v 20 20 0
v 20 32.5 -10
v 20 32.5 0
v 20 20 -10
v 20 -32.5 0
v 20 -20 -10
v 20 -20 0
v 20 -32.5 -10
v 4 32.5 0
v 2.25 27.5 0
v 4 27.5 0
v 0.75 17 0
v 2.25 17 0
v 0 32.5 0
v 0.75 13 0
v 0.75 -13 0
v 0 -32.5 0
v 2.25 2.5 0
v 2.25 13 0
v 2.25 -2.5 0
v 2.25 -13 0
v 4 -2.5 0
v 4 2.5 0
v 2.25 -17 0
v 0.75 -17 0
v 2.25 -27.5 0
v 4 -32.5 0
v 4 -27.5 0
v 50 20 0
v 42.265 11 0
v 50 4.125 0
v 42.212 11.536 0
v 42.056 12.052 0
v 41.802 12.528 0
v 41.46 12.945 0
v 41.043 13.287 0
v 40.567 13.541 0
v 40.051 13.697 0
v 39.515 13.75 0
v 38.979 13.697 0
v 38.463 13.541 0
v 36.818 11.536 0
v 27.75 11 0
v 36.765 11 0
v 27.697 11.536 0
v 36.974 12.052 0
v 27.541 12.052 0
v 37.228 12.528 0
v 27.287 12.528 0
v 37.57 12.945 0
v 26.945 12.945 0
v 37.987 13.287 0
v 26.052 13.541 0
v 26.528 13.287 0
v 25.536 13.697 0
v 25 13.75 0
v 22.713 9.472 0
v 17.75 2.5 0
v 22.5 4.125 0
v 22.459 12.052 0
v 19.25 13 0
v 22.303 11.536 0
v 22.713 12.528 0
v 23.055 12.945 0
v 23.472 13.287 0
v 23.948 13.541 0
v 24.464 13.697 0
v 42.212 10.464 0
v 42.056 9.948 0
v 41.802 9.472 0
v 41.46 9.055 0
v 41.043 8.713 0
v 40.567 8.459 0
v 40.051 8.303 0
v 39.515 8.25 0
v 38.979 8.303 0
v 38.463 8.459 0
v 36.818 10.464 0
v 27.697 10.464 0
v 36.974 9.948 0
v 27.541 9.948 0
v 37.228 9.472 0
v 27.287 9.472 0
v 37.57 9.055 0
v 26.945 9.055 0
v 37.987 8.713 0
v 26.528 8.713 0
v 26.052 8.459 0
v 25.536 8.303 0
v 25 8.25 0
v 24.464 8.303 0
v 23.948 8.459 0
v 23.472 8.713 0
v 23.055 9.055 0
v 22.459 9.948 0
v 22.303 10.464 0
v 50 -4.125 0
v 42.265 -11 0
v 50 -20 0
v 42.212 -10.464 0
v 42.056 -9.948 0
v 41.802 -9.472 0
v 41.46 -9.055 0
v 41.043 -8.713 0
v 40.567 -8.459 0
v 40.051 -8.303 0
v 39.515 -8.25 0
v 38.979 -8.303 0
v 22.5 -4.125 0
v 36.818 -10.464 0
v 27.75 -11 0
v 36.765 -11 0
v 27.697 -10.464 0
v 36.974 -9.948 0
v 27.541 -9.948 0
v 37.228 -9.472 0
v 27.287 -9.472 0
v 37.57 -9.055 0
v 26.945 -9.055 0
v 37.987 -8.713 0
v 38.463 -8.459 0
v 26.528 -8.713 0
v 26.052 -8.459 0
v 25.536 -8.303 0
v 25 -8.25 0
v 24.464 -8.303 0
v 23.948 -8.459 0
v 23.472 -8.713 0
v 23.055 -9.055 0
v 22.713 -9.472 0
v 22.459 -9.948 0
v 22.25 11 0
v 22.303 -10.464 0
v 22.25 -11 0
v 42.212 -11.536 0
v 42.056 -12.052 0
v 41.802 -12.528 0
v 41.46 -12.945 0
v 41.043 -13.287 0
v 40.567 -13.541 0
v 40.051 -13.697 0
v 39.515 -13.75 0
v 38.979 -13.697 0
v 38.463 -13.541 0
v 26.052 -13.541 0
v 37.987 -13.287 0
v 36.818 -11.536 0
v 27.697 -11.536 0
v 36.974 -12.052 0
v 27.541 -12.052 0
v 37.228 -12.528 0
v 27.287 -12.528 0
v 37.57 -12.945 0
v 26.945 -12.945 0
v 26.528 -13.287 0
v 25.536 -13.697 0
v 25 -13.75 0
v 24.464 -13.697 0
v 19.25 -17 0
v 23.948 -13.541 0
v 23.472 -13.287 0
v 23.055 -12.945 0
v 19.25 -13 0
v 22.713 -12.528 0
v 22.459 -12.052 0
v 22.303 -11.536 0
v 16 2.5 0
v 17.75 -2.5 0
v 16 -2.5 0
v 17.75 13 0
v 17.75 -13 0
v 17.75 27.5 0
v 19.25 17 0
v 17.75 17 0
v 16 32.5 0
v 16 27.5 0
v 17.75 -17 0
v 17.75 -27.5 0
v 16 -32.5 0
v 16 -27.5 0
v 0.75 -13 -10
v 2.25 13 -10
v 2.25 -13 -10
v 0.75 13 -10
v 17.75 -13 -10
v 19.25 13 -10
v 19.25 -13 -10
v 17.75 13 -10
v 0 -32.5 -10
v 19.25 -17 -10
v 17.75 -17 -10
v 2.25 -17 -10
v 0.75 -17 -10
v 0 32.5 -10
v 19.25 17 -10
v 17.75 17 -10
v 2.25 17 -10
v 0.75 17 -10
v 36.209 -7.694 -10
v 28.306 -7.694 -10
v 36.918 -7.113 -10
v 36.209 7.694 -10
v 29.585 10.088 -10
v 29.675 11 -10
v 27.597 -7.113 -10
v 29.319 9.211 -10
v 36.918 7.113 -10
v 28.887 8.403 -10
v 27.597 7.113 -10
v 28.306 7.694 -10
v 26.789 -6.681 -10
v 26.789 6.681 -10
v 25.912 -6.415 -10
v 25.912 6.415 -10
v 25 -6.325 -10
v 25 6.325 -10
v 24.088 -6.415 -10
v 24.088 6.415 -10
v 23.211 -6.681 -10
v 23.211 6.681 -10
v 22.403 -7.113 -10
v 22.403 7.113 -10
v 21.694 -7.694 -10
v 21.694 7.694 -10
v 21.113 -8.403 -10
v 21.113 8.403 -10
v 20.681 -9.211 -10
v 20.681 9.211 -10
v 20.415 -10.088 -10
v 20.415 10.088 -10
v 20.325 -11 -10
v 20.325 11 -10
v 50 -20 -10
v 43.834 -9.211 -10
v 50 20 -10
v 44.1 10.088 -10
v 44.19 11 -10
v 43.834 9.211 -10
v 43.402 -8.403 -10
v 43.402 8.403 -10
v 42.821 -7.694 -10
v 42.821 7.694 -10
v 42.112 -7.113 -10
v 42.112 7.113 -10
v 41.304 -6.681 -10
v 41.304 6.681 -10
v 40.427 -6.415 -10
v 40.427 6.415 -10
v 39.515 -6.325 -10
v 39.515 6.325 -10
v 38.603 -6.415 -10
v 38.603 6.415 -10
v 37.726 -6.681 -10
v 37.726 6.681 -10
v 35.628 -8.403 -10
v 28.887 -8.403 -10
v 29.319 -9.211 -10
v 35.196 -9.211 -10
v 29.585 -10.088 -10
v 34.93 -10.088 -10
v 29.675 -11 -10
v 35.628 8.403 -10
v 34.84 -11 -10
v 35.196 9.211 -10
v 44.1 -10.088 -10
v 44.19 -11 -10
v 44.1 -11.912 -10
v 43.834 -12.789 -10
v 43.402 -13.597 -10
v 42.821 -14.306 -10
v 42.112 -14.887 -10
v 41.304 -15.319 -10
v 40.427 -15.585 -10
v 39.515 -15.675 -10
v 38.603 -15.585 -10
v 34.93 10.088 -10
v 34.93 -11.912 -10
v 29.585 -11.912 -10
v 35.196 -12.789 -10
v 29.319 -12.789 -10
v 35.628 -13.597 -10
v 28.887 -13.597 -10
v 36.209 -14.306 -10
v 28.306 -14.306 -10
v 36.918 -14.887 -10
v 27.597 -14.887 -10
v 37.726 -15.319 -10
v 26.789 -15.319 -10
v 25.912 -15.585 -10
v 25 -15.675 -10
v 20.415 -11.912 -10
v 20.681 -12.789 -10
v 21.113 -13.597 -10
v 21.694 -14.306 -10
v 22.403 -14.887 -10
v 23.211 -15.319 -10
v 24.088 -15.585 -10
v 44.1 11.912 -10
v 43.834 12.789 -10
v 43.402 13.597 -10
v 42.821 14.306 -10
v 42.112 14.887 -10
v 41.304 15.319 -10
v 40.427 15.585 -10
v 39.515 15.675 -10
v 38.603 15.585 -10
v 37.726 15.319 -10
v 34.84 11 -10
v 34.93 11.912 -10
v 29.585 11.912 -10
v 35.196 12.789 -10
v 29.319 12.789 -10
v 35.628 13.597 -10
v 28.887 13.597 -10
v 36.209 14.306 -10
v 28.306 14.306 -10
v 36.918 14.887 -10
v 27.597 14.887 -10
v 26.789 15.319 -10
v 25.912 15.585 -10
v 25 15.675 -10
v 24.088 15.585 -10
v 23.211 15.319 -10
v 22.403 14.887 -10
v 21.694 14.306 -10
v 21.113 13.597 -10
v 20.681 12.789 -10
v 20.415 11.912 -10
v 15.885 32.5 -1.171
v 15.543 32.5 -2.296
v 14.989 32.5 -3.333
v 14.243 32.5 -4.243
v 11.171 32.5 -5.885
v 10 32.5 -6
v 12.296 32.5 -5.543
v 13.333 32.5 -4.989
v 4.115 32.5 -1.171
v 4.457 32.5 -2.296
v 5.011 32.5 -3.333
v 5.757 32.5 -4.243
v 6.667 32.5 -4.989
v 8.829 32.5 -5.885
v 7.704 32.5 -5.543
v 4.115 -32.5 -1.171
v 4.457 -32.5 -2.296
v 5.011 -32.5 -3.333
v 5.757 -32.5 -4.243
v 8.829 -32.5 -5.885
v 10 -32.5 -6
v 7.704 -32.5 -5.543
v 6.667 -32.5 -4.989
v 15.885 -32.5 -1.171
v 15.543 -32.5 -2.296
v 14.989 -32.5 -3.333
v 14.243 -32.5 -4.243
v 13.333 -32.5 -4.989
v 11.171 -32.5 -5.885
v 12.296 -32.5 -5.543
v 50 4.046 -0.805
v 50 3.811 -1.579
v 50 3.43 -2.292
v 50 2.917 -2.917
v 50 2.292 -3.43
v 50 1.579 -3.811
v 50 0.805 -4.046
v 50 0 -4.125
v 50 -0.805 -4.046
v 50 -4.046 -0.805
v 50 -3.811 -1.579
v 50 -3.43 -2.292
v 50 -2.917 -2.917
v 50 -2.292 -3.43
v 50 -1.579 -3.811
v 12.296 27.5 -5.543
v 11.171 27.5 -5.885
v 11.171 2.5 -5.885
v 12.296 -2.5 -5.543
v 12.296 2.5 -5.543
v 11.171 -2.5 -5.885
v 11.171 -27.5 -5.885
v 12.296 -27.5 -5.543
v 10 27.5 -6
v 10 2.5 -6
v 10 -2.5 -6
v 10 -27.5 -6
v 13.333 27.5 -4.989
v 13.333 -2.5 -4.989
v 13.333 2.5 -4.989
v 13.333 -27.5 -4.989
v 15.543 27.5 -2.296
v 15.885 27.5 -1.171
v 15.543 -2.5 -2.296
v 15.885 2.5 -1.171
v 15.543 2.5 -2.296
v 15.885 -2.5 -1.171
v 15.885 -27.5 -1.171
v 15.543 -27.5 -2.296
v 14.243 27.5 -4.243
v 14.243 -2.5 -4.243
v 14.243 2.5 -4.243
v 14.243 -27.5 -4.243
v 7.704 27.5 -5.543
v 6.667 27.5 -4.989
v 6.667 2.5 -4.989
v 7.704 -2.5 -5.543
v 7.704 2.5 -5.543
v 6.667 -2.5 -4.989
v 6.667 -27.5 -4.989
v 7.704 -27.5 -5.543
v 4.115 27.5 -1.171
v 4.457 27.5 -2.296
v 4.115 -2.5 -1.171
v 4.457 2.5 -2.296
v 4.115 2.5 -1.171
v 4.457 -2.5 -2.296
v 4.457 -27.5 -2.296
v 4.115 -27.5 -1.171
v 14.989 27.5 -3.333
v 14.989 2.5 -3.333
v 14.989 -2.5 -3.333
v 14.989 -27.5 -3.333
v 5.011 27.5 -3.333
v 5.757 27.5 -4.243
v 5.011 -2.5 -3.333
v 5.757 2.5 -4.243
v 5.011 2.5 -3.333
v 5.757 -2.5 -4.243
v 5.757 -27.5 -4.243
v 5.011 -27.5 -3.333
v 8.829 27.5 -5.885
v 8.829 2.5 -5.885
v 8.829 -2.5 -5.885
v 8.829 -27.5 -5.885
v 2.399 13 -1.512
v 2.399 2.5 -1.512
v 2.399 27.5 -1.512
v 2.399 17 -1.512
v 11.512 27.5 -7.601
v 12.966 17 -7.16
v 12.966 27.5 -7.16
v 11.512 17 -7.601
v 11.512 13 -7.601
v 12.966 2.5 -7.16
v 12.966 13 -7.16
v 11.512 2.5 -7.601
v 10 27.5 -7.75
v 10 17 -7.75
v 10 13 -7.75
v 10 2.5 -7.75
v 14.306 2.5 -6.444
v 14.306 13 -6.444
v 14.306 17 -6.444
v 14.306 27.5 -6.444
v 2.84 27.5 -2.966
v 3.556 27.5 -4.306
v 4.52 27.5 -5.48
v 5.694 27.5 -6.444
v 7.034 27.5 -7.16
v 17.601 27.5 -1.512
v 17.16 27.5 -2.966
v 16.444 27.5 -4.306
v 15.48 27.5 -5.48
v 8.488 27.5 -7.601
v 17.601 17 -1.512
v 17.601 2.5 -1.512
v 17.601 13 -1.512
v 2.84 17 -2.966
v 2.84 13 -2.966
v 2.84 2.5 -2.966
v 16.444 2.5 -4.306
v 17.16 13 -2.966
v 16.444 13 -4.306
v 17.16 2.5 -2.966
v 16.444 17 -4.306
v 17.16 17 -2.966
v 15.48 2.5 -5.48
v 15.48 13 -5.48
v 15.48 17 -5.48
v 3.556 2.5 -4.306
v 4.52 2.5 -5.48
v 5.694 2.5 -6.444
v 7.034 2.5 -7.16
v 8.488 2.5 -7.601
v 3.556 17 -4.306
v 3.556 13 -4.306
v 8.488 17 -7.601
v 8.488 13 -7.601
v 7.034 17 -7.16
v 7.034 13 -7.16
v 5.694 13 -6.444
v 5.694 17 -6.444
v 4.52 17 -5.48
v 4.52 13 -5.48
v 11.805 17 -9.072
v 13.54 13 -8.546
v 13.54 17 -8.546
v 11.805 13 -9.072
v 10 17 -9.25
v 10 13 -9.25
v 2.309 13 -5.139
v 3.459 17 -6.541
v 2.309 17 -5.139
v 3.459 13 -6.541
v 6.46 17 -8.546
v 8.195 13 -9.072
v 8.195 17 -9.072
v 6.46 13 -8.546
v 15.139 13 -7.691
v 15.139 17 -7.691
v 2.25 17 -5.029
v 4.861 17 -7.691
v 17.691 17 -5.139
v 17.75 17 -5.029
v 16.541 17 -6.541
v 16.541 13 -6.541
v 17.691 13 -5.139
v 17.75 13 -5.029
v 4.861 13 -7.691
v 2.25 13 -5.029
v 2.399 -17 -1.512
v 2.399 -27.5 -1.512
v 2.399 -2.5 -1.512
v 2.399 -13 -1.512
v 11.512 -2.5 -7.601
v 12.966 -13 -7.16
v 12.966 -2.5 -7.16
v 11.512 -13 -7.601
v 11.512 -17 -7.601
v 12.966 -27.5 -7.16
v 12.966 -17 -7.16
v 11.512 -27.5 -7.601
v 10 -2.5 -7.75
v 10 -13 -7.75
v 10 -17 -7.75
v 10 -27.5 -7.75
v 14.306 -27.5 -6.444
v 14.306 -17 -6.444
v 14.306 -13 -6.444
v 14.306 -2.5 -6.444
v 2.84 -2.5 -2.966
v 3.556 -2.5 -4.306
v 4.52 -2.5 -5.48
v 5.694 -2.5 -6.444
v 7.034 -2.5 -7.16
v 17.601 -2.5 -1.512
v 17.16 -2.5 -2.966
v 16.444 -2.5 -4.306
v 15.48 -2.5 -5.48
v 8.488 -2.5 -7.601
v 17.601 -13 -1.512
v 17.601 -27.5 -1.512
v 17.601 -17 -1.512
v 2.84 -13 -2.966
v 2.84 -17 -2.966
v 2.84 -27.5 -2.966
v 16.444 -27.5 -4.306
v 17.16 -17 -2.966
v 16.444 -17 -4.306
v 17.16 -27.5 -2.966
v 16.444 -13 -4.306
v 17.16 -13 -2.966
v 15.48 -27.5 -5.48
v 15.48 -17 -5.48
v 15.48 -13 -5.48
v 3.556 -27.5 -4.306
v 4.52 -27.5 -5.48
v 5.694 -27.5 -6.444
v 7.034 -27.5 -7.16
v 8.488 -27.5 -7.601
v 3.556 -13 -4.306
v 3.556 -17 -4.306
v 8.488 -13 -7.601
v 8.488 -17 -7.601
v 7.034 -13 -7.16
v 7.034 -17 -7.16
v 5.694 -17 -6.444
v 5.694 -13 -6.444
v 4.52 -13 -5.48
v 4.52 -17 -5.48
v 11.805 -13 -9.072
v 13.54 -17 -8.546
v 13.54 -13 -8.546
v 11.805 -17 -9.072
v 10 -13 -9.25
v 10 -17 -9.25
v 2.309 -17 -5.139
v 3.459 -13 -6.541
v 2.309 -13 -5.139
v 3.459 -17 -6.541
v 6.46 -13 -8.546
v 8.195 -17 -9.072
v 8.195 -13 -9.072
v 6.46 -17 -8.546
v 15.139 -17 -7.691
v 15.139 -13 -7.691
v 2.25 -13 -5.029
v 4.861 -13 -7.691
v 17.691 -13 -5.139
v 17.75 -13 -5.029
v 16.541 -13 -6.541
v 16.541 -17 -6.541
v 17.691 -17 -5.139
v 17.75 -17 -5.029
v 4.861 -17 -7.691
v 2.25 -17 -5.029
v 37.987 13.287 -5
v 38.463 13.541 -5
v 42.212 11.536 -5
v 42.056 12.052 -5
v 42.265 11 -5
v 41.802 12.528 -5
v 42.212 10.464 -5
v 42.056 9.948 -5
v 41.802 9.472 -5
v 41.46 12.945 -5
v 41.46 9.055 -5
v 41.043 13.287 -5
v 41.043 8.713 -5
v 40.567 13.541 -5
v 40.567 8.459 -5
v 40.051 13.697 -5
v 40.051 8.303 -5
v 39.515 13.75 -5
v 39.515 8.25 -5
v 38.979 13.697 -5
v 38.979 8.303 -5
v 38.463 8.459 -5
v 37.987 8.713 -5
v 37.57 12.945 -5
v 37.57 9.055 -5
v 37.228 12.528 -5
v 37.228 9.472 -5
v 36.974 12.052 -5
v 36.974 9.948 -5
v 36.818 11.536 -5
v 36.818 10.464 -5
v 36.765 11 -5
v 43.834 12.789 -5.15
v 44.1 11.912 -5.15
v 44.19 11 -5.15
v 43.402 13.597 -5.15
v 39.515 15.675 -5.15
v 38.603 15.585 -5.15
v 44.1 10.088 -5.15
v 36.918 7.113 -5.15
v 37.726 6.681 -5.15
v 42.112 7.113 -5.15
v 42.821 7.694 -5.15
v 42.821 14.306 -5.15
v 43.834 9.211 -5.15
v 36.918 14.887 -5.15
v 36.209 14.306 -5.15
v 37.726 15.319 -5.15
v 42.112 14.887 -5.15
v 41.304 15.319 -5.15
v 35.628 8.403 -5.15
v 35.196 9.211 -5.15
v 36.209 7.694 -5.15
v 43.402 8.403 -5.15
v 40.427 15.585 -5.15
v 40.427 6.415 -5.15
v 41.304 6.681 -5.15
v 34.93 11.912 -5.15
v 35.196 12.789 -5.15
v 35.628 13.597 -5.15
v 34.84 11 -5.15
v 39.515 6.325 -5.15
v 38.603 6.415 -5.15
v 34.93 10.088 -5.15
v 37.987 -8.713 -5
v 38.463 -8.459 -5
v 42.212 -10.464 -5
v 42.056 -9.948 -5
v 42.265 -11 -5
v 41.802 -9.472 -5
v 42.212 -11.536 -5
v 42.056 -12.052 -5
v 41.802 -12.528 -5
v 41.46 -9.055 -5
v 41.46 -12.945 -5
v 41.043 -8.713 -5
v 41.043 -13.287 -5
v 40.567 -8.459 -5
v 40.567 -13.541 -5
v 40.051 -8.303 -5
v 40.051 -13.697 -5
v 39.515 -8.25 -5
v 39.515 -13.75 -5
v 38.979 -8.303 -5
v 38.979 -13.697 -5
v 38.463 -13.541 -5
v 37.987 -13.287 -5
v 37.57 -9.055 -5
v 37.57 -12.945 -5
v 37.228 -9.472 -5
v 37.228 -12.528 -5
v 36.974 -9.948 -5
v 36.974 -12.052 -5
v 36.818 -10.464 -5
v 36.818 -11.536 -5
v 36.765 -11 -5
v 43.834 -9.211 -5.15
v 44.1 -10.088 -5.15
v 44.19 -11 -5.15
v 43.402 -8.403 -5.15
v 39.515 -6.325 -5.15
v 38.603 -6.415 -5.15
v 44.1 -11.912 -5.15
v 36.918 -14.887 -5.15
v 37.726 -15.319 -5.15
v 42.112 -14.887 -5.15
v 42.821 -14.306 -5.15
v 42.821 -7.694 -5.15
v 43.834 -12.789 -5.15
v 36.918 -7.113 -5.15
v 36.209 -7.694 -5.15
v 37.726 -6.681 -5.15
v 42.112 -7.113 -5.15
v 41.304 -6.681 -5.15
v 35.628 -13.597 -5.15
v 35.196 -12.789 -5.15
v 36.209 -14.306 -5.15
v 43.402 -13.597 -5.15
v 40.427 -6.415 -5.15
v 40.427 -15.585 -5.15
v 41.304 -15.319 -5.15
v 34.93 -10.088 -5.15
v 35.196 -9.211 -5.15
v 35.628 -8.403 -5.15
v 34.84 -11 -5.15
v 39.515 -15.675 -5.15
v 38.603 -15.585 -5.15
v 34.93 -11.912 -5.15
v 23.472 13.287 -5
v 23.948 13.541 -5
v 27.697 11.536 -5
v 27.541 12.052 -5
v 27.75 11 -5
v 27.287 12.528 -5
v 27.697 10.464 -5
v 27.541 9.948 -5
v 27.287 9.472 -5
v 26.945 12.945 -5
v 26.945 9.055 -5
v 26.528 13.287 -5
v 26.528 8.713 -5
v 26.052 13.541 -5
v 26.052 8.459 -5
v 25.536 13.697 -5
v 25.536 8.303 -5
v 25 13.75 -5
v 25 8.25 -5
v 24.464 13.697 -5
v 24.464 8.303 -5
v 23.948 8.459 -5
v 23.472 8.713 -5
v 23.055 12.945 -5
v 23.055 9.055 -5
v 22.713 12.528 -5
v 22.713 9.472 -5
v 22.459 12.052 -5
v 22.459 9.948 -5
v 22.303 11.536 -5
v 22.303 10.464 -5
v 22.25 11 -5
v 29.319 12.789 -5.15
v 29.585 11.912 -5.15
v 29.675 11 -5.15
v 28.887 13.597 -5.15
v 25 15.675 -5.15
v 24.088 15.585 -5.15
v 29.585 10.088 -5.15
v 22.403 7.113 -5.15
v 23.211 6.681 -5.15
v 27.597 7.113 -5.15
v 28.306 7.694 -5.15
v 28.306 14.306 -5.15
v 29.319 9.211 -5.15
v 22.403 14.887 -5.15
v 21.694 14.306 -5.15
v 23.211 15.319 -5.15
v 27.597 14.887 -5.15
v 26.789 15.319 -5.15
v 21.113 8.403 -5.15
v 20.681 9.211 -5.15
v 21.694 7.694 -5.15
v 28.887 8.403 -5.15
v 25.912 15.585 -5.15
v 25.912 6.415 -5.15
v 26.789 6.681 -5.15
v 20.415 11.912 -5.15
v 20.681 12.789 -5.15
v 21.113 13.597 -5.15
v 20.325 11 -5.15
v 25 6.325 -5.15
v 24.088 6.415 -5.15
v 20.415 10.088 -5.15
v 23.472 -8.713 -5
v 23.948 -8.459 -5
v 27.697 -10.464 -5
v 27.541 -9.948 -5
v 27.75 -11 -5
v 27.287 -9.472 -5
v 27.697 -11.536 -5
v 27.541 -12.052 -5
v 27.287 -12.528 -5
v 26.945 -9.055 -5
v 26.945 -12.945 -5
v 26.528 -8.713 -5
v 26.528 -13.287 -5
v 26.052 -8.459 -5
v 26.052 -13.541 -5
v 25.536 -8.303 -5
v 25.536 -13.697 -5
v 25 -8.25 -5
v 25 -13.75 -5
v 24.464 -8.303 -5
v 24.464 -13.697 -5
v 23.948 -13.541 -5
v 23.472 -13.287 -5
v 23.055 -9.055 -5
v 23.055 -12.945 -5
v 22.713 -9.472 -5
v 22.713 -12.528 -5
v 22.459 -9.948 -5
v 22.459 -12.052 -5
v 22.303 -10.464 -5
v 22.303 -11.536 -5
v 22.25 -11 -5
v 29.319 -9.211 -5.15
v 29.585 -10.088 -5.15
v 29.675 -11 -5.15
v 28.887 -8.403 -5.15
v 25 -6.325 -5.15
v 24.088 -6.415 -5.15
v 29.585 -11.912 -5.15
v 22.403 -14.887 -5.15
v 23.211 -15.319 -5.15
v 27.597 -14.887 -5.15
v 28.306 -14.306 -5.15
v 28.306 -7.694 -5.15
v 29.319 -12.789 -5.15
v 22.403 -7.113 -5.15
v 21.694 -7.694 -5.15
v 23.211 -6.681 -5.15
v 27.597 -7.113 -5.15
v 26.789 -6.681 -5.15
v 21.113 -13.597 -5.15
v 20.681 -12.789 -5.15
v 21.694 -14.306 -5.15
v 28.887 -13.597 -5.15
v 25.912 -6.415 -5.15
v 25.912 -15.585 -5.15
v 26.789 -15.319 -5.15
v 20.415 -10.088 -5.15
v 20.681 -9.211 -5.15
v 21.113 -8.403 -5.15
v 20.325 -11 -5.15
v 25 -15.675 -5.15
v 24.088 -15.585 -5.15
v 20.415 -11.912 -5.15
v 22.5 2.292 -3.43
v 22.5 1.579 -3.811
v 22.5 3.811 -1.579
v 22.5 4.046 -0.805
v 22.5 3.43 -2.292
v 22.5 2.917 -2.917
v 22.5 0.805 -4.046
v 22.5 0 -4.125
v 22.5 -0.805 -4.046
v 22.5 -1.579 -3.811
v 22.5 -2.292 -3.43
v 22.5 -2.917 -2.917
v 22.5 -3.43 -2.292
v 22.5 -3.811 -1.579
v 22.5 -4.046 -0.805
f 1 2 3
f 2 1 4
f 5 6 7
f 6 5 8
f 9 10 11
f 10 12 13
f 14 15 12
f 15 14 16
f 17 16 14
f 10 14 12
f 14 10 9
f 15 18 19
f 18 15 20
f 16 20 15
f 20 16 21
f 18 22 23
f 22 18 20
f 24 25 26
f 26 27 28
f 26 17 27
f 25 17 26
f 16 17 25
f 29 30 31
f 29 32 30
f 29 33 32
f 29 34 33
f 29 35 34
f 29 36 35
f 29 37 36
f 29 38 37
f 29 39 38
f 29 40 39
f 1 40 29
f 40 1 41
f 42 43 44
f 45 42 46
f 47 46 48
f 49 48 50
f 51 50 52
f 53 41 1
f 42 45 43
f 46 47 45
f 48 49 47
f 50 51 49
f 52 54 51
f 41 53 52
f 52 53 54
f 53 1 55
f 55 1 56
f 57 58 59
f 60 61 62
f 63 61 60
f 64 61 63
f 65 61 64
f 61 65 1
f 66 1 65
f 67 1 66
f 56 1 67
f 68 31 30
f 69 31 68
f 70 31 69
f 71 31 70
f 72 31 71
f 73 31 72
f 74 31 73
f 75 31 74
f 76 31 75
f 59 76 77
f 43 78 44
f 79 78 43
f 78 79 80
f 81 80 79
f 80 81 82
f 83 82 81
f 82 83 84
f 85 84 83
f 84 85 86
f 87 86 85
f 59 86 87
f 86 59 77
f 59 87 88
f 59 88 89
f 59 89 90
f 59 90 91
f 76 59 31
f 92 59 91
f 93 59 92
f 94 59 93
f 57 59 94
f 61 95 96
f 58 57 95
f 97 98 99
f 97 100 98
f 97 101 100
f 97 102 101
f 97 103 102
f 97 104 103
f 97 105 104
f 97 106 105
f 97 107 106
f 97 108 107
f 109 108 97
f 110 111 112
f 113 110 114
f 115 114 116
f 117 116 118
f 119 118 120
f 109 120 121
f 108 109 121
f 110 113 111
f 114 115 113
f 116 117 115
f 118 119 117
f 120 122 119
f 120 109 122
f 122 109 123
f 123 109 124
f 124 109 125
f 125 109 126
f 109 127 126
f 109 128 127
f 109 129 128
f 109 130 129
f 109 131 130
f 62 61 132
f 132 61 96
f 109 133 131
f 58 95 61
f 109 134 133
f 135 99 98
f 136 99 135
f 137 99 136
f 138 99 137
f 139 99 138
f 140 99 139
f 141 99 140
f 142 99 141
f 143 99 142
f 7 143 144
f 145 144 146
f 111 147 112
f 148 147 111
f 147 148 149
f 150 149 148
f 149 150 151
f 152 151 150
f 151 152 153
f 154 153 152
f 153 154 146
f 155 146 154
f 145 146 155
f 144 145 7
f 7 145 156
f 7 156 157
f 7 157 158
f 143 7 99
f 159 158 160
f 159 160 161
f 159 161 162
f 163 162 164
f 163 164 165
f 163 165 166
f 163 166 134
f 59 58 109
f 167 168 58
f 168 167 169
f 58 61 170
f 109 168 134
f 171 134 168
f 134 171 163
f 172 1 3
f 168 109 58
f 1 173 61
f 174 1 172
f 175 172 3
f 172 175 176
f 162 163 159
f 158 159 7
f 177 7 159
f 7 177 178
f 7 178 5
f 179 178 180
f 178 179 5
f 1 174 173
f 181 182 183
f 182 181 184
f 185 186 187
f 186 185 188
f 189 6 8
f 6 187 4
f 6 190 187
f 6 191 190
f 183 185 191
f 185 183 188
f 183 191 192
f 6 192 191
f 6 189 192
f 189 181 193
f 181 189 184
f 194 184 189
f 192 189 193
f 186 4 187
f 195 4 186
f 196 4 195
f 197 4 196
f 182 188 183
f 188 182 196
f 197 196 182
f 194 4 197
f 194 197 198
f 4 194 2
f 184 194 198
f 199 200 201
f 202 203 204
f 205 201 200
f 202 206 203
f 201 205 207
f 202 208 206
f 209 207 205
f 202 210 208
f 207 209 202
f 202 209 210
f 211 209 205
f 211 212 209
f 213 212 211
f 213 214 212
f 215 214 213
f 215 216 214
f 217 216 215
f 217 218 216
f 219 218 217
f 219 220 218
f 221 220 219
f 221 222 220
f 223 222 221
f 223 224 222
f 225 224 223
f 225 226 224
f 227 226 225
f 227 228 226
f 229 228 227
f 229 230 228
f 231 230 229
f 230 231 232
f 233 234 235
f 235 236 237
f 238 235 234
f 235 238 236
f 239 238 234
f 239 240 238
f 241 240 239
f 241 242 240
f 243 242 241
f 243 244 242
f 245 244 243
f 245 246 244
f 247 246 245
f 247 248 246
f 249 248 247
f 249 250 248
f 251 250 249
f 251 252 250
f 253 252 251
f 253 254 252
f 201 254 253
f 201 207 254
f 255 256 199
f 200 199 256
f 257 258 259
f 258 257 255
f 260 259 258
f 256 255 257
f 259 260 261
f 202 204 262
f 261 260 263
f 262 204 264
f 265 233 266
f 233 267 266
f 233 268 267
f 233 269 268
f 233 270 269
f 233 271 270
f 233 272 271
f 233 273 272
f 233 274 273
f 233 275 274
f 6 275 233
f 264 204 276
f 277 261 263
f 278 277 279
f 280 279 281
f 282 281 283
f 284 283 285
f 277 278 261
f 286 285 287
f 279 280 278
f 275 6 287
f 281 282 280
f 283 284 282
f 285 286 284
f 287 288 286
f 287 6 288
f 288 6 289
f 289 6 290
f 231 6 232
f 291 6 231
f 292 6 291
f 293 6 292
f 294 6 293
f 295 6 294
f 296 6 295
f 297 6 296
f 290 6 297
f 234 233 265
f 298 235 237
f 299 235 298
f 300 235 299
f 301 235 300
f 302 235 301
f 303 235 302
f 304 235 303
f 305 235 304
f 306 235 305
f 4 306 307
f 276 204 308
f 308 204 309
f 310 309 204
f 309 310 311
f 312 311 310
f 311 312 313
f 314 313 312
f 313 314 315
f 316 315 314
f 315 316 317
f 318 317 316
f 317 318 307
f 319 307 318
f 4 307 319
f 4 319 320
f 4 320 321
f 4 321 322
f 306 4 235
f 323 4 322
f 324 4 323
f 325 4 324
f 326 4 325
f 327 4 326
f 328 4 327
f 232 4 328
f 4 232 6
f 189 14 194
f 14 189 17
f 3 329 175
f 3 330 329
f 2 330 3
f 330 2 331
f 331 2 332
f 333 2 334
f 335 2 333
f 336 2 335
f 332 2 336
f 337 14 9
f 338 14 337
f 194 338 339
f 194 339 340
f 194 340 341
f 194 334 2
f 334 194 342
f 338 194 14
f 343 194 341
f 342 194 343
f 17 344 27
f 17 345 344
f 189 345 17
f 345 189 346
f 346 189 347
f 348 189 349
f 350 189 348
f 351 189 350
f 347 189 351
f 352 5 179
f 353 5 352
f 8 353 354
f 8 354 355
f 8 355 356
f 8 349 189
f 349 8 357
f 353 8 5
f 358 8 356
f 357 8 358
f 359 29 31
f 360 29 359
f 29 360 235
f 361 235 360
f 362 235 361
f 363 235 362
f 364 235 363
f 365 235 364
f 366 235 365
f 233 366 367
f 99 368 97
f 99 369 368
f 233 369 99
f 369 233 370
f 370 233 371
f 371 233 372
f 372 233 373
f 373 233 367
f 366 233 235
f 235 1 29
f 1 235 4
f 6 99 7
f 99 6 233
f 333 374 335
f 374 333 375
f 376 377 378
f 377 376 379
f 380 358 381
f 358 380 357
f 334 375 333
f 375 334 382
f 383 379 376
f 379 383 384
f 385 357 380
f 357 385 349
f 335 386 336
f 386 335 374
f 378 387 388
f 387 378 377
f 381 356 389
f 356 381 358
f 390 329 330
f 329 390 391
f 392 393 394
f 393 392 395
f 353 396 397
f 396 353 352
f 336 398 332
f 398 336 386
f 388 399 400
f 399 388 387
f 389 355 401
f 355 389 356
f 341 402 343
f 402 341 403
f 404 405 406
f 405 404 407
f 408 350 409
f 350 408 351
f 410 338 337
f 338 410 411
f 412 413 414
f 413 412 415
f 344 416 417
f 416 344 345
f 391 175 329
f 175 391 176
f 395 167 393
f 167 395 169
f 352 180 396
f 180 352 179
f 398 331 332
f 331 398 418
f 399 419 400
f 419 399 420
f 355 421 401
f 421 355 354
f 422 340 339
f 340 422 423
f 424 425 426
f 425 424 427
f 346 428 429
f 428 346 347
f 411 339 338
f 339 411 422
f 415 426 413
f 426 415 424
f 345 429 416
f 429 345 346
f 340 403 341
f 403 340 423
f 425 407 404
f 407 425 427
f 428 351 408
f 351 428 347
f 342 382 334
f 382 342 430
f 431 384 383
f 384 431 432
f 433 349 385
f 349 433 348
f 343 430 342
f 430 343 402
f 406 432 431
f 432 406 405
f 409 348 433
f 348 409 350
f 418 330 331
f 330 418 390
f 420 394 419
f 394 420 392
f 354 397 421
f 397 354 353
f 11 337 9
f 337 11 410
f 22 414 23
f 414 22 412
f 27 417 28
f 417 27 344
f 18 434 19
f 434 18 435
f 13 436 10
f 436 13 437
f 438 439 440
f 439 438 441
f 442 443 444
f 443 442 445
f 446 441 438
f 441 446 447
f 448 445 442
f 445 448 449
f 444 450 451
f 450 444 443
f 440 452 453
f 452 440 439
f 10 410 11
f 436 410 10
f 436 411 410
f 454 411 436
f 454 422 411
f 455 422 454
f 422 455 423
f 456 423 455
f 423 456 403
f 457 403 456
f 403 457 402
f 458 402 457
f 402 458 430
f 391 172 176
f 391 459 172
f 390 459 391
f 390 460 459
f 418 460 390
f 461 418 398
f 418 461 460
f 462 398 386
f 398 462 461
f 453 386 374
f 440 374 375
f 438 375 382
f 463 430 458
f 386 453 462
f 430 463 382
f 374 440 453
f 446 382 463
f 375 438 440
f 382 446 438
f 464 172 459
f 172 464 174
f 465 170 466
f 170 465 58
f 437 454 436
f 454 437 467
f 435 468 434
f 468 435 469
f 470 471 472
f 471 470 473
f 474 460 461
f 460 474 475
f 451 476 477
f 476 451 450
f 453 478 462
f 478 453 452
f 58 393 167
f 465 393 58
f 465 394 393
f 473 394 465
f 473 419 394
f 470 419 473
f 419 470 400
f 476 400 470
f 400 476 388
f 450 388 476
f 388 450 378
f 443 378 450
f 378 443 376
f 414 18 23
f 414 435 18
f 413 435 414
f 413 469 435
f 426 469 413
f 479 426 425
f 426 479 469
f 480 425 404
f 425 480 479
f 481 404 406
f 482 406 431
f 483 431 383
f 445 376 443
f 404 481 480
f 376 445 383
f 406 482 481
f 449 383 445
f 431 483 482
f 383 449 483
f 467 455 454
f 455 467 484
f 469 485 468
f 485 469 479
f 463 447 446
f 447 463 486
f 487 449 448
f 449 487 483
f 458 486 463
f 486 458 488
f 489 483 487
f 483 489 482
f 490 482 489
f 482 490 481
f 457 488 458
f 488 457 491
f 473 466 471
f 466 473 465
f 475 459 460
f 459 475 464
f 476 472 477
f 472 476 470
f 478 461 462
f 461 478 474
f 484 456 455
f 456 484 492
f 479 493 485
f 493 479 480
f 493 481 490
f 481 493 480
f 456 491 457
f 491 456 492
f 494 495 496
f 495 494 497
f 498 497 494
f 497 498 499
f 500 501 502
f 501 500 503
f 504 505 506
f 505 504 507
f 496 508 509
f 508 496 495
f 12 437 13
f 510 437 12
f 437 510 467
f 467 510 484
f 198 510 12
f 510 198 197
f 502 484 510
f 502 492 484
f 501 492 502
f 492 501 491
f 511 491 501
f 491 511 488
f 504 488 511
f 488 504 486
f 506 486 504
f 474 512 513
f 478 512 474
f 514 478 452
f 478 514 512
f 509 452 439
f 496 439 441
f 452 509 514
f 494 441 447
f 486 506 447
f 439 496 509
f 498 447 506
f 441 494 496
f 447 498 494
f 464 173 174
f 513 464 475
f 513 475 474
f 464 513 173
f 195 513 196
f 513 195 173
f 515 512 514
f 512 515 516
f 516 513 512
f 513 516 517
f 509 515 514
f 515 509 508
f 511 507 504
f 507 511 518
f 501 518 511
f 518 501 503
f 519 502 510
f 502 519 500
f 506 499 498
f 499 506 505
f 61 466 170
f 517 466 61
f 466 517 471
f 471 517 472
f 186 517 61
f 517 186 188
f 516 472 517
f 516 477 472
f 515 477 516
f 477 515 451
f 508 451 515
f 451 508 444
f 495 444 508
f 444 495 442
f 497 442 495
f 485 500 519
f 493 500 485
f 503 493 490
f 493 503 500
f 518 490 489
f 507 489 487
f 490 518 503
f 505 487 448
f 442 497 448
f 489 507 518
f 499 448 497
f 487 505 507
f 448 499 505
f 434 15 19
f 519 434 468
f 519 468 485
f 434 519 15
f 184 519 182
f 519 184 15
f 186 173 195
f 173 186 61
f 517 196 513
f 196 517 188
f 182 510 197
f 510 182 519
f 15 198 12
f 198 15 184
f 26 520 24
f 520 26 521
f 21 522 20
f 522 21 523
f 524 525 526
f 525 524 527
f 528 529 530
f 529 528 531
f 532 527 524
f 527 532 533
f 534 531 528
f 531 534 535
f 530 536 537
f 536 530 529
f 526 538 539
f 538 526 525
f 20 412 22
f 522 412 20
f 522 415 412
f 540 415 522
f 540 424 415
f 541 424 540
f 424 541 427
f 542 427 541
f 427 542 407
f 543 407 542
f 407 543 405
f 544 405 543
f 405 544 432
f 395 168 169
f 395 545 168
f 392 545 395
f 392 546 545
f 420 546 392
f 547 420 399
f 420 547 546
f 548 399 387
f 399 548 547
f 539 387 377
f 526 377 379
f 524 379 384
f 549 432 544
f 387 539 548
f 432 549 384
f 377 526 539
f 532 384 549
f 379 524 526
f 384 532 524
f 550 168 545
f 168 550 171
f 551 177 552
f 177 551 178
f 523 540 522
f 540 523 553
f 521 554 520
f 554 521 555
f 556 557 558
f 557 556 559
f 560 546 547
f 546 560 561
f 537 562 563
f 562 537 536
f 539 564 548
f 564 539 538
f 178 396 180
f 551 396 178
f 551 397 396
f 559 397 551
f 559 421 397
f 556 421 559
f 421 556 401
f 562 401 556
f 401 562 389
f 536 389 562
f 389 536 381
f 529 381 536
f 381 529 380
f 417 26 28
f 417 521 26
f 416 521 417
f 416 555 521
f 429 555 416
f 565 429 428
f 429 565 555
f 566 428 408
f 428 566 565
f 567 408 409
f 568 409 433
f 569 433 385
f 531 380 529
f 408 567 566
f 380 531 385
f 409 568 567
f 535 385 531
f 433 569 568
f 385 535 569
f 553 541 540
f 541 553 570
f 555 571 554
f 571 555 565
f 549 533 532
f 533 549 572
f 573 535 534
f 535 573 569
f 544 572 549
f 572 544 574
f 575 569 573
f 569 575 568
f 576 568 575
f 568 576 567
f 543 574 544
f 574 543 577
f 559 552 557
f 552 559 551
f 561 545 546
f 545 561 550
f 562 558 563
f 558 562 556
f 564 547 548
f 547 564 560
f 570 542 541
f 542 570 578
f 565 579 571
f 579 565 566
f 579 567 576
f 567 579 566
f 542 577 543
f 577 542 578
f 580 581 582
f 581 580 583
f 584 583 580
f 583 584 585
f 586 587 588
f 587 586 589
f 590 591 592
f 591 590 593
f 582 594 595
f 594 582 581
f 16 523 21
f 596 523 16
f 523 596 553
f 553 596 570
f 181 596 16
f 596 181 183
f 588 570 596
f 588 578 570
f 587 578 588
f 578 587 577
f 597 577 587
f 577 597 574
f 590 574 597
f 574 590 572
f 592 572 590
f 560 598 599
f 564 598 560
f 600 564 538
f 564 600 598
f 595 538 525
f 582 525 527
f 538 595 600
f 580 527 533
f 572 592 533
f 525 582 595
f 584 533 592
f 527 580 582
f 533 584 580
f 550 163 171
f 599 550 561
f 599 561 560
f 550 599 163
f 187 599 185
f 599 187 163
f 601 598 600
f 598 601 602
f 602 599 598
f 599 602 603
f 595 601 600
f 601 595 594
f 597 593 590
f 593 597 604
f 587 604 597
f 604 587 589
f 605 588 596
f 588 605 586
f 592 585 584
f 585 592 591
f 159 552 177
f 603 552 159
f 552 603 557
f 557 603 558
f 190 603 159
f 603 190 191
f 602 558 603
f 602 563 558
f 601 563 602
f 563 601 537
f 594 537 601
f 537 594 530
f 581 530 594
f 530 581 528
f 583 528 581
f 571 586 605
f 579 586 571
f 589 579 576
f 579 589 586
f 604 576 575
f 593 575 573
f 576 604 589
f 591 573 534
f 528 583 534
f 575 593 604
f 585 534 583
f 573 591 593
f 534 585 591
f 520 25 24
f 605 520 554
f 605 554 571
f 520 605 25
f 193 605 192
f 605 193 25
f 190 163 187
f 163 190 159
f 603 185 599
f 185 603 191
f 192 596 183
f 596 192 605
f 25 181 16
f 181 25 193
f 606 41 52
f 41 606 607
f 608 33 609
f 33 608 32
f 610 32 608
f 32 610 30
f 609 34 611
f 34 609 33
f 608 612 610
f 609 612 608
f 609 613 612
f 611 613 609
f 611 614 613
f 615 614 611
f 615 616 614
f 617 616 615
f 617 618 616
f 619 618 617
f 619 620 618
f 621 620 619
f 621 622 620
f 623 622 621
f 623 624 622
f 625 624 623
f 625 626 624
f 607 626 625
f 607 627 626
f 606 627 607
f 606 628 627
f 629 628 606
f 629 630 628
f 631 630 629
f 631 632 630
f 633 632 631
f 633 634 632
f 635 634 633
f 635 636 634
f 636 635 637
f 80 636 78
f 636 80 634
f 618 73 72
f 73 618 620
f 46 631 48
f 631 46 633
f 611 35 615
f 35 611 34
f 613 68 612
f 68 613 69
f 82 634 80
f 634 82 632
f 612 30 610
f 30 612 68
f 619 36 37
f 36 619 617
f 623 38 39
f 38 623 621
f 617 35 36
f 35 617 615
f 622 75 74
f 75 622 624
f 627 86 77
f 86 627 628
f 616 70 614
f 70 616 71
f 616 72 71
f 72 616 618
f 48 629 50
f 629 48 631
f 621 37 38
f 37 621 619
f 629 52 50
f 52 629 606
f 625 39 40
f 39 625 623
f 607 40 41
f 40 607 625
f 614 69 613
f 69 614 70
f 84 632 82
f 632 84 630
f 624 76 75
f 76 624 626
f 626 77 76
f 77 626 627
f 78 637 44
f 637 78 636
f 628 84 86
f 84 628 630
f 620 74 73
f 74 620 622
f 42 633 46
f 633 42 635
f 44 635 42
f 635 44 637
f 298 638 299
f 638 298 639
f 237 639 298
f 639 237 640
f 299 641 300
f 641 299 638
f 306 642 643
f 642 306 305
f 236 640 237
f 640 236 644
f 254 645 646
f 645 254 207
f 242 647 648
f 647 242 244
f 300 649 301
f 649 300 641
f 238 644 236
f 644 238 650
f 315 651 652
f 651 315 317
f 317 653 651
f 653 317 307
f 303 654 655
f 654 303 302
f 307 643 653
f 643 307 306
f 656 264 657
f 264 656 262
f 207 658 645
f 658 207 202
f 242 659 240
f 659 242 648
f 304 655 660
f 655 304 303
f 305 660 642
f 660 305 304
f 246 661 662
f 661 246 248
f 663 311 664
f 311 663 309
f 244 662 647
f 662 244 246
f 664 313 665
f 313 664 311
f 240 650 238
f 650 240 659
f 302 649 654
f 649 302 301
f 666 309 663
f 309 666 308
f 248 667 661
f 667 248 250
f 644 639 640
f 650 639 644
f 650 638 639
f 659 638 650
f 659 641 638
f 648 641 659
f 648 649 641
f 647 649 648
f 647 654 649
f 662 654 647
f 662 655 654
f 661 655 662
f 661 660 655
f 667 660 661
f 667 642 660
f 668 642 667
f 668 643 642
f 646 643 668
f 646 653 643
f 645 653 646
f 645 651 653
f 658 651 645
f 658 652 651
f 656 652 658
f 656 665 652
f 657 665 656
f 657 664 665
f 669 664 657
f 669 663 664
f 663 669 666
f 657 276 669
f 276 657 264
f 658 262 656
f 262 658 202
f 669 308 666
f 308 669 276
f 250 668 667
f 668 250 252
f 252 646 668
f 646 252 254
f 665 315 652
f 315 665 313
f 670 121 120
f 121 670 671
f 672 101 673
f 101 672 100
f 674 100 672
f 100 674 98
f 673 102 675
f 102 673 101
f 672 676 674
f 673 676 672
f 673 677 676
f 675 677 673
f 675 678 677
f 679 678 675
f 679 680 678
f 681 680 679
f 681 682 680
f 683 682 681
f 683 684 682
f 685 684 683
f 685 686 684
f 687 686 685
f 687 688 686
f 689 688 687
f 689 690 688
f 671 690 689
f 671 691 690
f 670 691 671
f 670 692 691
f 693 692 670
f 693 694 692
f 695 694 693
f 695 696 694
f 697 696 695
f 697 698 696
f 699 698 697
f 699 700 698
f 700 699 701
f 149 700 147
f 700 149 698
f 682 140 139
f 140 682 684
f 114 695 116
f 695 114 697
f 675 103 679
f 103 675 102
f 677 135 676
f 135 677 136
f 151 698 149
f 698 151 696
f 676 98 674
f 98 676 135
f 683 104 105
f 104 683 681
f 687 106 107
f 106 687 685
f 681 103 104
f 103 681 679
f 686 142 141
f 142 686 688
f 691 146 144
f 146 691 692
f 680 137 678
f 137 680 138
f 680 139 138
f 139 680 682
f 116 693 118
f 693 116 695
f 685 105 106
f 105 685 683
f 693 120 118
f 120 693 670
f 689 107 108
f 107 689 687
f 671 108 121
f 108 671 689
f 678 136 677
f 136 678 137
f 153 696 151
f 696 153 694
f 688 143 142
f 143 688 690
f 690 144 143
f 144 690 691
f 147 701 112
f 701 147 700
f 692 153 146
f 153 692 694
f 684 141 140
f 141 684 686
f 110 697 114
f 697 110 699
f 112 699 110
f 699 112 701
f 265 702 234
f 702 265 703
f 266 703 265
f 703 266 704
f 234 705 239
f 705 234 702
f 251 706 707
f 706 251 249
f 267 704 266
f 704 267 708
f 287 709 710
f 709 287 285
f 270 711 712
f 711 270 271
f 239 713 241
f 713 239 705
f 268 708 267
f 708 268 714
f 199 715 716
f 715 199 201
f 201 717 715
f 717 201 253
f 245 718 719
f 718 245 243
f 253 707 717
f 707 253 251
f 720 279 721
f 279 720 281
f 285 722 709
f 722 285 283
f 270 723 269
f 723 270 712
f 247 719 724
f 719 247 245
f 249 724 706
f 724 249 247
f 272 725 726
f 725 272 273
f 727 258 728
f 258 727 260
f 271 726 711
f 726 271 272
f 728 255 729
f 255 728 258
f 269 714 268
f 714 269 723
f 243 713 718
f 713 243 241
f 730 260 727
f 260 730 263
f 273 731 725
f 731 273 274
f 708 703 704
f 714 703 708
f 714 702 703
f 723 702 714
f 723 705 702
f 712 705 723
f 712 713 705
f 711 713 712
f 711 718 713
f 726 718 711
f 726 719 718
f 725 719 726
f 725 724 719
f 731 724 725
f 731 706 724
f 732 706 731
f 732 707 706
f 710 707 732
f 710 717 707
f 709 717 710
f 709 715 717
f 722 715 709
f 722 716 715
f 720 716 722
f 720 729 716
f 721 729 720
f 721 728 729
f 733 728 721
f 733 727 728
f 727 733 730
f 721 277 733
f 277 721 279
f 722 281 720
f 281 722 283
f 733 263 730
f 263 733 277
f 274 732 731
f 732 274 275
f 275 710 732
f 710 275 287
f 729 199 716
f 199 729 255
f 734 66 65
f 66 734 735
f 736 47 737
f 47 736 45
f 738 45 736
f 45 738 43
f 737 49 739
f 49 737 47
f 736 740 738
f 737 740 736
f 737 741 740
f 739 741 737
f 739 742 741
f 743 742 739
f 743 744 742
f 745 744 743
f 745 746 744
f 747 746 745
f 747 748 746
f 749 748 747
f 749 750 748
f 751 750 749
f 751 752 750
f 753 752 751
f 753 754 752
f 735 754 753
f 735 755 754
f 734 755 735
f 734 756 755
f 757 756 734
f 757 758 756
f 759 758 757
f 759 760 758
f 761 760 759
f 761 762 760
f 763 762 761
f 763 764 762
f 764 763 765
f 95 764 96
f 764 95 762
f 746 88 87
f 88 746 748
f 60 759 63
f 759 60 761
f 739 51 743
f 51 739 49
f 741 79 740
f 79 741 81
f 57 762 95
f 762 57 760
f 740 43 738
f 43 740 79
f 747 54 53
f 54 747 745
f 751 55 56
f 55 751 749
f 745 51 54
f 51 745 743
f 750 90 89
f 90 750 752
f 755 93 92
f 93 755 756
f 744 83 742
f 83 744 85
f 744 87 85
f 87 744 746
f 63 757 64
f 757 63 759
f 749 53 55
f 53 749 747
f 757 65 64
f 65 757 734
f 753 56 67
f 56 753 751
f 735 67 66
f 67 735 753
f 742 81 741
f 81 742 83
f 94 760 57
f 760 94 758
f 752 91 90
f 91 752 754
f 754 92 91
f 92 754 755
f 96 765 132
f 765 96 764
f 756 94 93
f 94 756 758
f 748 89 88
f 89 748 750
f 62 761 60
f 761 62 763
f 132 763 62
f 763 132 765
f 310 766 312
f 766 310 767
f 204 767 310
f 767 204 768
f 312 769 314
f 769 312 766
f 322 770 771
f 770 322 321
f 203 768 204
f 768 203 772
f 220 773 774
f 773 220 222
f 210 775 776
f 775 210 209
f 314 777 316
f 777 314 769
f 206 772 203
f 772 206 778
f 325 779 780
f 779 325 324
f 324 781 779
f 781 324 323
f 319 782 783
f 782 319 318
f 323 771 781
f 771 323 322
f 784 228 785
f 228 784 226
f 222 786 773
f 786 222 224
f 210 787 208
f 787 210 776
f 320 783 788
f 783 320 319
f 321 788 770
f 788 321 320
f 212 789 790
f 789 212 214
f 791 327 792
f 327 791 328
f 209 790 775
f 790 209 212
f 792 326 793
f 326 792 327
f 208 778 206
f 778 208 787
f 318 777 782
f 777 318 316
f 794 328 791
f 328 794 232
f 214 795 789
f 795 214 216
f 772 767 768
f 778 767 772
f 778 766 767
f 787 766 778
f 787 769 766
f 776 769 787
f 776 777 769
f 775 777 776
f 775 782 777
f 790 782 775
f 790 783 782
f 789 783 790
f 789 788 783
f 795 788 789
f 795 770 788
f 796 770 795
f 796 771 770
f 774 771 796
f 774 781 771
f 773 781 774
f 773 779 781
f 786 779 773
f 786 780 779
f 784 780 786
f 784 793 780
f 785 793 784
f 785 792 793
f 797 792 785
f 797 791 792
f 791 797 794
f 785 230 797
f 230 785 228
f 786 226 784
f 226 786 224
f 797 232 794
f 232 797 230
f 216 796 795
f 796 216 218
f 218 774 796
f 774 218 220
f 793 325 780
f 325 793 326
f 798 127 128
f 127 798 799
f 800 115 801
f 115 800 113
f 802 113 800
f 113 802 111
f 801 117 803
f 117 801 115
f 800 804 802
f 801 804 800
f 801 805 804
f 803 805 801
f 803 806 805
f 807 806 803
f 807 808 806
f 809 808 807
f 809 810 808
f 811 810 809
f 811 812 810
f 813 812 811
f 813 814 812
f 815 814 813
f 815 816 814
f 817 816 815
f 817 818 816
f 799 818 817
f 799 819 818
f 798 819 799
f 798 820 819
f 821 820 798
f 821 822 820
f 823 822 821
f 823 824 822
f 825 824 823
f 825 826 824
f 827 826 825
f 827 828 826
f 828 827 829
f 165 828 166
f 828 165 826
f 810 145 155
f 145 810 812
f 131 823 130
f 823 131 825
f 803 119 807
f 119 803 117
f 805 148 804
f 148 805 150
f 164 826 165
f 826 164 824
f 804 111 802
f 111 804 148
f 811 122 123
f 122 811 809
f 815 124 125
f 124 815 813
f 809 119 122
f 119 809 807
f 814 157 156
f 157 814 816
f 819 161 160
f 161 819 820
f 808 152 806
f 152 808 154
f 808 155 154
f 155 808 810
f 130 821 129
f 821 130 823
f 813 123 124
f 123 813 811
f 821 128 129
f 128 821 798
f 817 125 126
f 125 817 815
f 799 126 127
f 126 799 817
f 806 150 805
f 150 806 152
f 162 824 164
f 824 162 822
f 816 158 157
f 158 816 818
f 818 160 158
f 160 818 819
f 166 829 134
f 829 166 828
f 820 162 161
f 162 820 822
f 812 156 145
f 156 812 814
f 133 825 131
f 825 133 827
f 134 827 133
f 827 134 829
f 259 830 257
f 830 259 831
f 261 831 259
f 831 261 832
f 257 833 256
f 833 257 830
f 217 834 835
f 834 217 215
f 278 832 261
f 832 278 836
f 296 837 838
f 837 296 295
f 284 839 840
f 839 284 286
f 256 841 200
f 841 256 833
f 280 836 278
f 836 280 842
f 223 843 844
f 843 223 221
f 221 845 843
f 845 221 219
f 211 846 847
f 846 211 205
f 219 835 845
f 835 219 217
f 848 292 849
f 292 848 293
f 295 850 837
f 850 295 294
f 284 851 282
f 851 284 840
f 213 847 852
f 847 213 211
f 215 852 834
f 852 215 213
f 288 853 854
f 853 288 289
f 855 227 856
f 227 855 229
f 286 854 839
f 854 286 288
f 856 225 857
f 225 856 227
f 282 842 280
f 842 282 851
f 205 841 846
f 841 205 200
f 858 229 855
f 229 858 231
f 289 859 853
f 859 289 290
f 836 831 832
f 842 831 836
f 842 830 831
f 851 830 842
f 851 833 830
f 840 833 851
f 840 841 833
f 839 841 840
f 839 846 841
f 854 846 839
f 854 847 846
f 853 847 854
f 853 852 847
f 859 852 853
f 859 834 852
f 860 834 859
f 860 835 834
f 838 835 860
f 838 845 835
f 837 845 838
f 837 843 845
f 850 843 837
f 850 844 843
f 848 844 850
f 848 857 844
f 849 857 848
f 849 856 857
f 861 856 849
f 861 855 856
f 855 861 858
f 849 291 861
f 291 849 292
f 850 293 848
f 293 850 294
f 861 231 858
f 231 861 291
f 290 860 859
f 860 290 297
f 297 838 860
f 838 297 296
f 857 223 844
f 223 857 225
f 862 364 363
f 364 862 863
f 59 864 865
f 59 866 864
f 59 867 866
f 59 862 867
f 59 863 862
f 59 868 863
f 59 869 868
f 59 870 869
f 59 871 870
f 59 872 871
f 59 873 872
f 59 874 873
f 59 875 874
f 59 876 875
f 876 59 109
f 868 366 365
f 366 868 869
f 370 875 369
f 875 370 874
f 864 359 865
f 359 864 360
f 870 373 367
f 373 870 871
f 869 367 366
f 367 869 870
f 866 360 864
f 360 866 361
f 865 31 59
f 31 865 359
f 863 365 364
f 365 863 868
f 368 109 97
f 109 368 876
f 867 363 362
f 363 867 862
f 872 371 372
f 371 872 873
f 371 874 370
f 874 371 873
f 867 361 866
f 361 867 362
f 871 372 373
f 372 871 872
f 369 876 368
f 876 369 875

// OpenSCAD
// file: ../library.scad
module lm8uu (shaft_length=100) {
  d = 15.5;
  l = 24+1;
  cylinder(d=8+4, h=shaft_length, center=true);
  cylinder(d=d, h=l, center=true);
}

module lm8uu_zip_tie (thickness, width) {
  d = 15.5;
  cylinder(d=15.5+thickness*2, h=width, center=true);
  translate([0,0+(d+thickness)/2,0]) cube([100,thickness,width], center=true);
  translate([0,0-(d+thickness)/2,0]) cube([100,thickness,width], center=true);
}

module m3_mounting_hole(use_insert_nuts=false) {
  if (!use_insert_nuts) {
    translate([0, 0, 0]) rotate([90,0,0]) cylinder(d=3+0.5, h=8);
    slot_width = 5.5+0.6;
    slot_depth = 2.4+0.6;
    translate([0, -2-(slot_depth)/2, 0]) cube([slot_width,slot_depth,100], center=true);
  } else {
    translate([0, 0 + 2.5 - 5, 0]) rotate([90,0,0]) cylinder(d=4, h=5, center=true);
  }
}

function screw_head_diameter(screw_diameter) = lookup(screw_diameter, [
   [1.4, 2.6],
   [1.6, 3],
   [2.0, 3.8],
   [2.5, 4.5],
   [3.0, 5.5],
   [4.0, 7],
   [5.0, 8.5],
   [6.0, 10],
   [8.0, 13],
   [ 10, 16],
   [ 12, 18],
   [ 14, 21],
   [ 16, 24],
   [ 18, 27],
   [ 20, 30]
 ]);

// scale allows for better fit of screw in hole
// seperation avoids overhands when printing screw hole with head at bottom
module screw (d, l, head=true, scale=1.1, separation=0) { 
  half_scale = (1+(scale-1)/2);
  cylinder(h=l, d=d*scale, center=false);
  if (head) {translate([0,0,-d*half_scale]) cylinder(
    d=screw_head_diameter(d)*scale,
    h=d*scale-separation
  );}
}

module GT2_tooth(h) {
  extra_width = 0.5;
  translate([-1,-0.5-extra_width,0]) cube([2,0.5+extra_width,h]);
  linear_extrude(height=h) polygon([[0.747183,-0.5],[0.747183,0],[0.647876,0.037218],[0.598311,0.130528],[0.578556,0.238423],[0.547158,0.343077],[0.504649,0.443762],[0.451556,0.53975],[0.358229,0.636924],[0.2484,0.707276],[0.127259,0.750044],[0,0.76447],[-0.127259,0.750044],[-0.2484,0.707276],[-0.358229,0.636924],[-0.451556,0.53975],[-0.504797,0.443762],[-0.547291,0.343077],[-0.578605,0.238423],[-0.598311,0.130528],[-0.648009,0.037218],[-0.747183,0],[-0.747183,-0.5]]);
}

module nema17(height, screw_mask_height=0, screw_mask_slot_length=0, center_mask_height=2.5) {
  difference() {
    translate([0,0,-height/2]) hull() {
      cube([42.3, 31, height], center=true);
      cube([31, 42.3, height], center=true);
    }
    translate([31/2,31/2,-4.5]) cylinder(h=9,d=3);
    translate([31/2,-31/2,-4.5]) cylinder(h=9,d=3);
    translate([-31/2,31/2,-4.5]) cylinder(h=9,d=3);
    translate([-31/2,-31/2,-4.5]) cylinder(h=9,d=3);
  }
  cylinder(h=center_mask_height, d=22+2);
  cylinder(h=27, d=5+2);
    
  screw_slot( 31/2, 31/2);
  screw_slot( 31/2,-31/2);
  screw_slot(-31/2, 31/2);
  screw_slot(-31/2,-31/2);
  
  module screw_slot(x, y) { hull() {
    dx = x > 0 ? screw_mask_slot_length/2 : -screw_mask_slot_length/2;
    dy = y > 0 ? screw_mask_slot_length/2 : -screw_mask_slot_length/2;
    translate([x+dx,y+dy,screw_mask_height]) rotate([180,0,0]) screw(d=3, l=screw_mask_height, d=3, head=false);
    translate([x-dx,y-dy,screw_mask_height]) rotate([180,0,0]) screw(d=3, l=screw_mask_height, d=3, head=false);
  }}
}
// main file
$fn=32;
use <../library.scad>;

// options
with_linear_bearings = true;
use_insert_nuts=true;
layer_height=0.2; // required to force printed layer between screw head and thread (screw_separation)

// constants
nema17_width = 42.3;
GT2_pulley_diameter = 12.73;
GT2_thickness = 2;
pulley_diameter = 20;
screw_x = nema17_width/2 + GT2_pulley_diameter/2 + GT2_thickness + pulley_diameter/2;
screw_separation=with_linear_bearings ? 2*layer_height : 0;

difference() {
  if(with_linear_bearings) union() {
    translate([20/2,0,-10/2]) cube([20,65,10], center=true);
    translate([50/2,0,-10/2]) cube([50,40,10], center=true);
  } else {
    translate([30/2+20,0,0]) cube([30,40,20], center=true);
  }
  //y-axis shaft + bearings
  _bearing_y_offset = 25/2+2.5;
  translate([10, _bearing_y_offset,0]) rotate([90,90,0]) lm8uu();
  translate([10, _bearing_y_offset,0]) rotate([90,90,0]) lm8uu_zip_tie(width=4, thickness=1.5);
  translate([10,-_bearing_y_offset,0]) rotate([90,90,0]) lm8uu();
  translate([10,-_bearing_y_offset,0]) rotate([90,90,0]) lm8uu_zip_tie(width=4, thickness=1.5);
  
  //x-axis shafts
  translate([22.5,0,0]) rotate([0,90,0]) cylinder(d=8+0.25, h=40);
  
  //pulley holding screws
  translate([screw_x, 11,-10+5]) screw(d=5, l=40, separation=screw_separation);;
  translate([screw_x,-11,-10+5]) screw(d=5, l=40, separation=screw_separation);
  //additional screws
  if(with_linear_bearings) {
    translate([25, 11,-10+5]) screw(d=5, l=40, separation=screw_separation);
    translate([25,-11,-10+5]) screw(d=5, l=40, separation=screw_separation);
  }
  
  // ### side mounting holes ###
  translate([33,32.5,-5]) m3_mounting_hole(use_insert_nuts);
  translate([33,-32.5,-5]) rotate([0,0,180]) m3_mounting_hole(use_insert_nuts);
}
